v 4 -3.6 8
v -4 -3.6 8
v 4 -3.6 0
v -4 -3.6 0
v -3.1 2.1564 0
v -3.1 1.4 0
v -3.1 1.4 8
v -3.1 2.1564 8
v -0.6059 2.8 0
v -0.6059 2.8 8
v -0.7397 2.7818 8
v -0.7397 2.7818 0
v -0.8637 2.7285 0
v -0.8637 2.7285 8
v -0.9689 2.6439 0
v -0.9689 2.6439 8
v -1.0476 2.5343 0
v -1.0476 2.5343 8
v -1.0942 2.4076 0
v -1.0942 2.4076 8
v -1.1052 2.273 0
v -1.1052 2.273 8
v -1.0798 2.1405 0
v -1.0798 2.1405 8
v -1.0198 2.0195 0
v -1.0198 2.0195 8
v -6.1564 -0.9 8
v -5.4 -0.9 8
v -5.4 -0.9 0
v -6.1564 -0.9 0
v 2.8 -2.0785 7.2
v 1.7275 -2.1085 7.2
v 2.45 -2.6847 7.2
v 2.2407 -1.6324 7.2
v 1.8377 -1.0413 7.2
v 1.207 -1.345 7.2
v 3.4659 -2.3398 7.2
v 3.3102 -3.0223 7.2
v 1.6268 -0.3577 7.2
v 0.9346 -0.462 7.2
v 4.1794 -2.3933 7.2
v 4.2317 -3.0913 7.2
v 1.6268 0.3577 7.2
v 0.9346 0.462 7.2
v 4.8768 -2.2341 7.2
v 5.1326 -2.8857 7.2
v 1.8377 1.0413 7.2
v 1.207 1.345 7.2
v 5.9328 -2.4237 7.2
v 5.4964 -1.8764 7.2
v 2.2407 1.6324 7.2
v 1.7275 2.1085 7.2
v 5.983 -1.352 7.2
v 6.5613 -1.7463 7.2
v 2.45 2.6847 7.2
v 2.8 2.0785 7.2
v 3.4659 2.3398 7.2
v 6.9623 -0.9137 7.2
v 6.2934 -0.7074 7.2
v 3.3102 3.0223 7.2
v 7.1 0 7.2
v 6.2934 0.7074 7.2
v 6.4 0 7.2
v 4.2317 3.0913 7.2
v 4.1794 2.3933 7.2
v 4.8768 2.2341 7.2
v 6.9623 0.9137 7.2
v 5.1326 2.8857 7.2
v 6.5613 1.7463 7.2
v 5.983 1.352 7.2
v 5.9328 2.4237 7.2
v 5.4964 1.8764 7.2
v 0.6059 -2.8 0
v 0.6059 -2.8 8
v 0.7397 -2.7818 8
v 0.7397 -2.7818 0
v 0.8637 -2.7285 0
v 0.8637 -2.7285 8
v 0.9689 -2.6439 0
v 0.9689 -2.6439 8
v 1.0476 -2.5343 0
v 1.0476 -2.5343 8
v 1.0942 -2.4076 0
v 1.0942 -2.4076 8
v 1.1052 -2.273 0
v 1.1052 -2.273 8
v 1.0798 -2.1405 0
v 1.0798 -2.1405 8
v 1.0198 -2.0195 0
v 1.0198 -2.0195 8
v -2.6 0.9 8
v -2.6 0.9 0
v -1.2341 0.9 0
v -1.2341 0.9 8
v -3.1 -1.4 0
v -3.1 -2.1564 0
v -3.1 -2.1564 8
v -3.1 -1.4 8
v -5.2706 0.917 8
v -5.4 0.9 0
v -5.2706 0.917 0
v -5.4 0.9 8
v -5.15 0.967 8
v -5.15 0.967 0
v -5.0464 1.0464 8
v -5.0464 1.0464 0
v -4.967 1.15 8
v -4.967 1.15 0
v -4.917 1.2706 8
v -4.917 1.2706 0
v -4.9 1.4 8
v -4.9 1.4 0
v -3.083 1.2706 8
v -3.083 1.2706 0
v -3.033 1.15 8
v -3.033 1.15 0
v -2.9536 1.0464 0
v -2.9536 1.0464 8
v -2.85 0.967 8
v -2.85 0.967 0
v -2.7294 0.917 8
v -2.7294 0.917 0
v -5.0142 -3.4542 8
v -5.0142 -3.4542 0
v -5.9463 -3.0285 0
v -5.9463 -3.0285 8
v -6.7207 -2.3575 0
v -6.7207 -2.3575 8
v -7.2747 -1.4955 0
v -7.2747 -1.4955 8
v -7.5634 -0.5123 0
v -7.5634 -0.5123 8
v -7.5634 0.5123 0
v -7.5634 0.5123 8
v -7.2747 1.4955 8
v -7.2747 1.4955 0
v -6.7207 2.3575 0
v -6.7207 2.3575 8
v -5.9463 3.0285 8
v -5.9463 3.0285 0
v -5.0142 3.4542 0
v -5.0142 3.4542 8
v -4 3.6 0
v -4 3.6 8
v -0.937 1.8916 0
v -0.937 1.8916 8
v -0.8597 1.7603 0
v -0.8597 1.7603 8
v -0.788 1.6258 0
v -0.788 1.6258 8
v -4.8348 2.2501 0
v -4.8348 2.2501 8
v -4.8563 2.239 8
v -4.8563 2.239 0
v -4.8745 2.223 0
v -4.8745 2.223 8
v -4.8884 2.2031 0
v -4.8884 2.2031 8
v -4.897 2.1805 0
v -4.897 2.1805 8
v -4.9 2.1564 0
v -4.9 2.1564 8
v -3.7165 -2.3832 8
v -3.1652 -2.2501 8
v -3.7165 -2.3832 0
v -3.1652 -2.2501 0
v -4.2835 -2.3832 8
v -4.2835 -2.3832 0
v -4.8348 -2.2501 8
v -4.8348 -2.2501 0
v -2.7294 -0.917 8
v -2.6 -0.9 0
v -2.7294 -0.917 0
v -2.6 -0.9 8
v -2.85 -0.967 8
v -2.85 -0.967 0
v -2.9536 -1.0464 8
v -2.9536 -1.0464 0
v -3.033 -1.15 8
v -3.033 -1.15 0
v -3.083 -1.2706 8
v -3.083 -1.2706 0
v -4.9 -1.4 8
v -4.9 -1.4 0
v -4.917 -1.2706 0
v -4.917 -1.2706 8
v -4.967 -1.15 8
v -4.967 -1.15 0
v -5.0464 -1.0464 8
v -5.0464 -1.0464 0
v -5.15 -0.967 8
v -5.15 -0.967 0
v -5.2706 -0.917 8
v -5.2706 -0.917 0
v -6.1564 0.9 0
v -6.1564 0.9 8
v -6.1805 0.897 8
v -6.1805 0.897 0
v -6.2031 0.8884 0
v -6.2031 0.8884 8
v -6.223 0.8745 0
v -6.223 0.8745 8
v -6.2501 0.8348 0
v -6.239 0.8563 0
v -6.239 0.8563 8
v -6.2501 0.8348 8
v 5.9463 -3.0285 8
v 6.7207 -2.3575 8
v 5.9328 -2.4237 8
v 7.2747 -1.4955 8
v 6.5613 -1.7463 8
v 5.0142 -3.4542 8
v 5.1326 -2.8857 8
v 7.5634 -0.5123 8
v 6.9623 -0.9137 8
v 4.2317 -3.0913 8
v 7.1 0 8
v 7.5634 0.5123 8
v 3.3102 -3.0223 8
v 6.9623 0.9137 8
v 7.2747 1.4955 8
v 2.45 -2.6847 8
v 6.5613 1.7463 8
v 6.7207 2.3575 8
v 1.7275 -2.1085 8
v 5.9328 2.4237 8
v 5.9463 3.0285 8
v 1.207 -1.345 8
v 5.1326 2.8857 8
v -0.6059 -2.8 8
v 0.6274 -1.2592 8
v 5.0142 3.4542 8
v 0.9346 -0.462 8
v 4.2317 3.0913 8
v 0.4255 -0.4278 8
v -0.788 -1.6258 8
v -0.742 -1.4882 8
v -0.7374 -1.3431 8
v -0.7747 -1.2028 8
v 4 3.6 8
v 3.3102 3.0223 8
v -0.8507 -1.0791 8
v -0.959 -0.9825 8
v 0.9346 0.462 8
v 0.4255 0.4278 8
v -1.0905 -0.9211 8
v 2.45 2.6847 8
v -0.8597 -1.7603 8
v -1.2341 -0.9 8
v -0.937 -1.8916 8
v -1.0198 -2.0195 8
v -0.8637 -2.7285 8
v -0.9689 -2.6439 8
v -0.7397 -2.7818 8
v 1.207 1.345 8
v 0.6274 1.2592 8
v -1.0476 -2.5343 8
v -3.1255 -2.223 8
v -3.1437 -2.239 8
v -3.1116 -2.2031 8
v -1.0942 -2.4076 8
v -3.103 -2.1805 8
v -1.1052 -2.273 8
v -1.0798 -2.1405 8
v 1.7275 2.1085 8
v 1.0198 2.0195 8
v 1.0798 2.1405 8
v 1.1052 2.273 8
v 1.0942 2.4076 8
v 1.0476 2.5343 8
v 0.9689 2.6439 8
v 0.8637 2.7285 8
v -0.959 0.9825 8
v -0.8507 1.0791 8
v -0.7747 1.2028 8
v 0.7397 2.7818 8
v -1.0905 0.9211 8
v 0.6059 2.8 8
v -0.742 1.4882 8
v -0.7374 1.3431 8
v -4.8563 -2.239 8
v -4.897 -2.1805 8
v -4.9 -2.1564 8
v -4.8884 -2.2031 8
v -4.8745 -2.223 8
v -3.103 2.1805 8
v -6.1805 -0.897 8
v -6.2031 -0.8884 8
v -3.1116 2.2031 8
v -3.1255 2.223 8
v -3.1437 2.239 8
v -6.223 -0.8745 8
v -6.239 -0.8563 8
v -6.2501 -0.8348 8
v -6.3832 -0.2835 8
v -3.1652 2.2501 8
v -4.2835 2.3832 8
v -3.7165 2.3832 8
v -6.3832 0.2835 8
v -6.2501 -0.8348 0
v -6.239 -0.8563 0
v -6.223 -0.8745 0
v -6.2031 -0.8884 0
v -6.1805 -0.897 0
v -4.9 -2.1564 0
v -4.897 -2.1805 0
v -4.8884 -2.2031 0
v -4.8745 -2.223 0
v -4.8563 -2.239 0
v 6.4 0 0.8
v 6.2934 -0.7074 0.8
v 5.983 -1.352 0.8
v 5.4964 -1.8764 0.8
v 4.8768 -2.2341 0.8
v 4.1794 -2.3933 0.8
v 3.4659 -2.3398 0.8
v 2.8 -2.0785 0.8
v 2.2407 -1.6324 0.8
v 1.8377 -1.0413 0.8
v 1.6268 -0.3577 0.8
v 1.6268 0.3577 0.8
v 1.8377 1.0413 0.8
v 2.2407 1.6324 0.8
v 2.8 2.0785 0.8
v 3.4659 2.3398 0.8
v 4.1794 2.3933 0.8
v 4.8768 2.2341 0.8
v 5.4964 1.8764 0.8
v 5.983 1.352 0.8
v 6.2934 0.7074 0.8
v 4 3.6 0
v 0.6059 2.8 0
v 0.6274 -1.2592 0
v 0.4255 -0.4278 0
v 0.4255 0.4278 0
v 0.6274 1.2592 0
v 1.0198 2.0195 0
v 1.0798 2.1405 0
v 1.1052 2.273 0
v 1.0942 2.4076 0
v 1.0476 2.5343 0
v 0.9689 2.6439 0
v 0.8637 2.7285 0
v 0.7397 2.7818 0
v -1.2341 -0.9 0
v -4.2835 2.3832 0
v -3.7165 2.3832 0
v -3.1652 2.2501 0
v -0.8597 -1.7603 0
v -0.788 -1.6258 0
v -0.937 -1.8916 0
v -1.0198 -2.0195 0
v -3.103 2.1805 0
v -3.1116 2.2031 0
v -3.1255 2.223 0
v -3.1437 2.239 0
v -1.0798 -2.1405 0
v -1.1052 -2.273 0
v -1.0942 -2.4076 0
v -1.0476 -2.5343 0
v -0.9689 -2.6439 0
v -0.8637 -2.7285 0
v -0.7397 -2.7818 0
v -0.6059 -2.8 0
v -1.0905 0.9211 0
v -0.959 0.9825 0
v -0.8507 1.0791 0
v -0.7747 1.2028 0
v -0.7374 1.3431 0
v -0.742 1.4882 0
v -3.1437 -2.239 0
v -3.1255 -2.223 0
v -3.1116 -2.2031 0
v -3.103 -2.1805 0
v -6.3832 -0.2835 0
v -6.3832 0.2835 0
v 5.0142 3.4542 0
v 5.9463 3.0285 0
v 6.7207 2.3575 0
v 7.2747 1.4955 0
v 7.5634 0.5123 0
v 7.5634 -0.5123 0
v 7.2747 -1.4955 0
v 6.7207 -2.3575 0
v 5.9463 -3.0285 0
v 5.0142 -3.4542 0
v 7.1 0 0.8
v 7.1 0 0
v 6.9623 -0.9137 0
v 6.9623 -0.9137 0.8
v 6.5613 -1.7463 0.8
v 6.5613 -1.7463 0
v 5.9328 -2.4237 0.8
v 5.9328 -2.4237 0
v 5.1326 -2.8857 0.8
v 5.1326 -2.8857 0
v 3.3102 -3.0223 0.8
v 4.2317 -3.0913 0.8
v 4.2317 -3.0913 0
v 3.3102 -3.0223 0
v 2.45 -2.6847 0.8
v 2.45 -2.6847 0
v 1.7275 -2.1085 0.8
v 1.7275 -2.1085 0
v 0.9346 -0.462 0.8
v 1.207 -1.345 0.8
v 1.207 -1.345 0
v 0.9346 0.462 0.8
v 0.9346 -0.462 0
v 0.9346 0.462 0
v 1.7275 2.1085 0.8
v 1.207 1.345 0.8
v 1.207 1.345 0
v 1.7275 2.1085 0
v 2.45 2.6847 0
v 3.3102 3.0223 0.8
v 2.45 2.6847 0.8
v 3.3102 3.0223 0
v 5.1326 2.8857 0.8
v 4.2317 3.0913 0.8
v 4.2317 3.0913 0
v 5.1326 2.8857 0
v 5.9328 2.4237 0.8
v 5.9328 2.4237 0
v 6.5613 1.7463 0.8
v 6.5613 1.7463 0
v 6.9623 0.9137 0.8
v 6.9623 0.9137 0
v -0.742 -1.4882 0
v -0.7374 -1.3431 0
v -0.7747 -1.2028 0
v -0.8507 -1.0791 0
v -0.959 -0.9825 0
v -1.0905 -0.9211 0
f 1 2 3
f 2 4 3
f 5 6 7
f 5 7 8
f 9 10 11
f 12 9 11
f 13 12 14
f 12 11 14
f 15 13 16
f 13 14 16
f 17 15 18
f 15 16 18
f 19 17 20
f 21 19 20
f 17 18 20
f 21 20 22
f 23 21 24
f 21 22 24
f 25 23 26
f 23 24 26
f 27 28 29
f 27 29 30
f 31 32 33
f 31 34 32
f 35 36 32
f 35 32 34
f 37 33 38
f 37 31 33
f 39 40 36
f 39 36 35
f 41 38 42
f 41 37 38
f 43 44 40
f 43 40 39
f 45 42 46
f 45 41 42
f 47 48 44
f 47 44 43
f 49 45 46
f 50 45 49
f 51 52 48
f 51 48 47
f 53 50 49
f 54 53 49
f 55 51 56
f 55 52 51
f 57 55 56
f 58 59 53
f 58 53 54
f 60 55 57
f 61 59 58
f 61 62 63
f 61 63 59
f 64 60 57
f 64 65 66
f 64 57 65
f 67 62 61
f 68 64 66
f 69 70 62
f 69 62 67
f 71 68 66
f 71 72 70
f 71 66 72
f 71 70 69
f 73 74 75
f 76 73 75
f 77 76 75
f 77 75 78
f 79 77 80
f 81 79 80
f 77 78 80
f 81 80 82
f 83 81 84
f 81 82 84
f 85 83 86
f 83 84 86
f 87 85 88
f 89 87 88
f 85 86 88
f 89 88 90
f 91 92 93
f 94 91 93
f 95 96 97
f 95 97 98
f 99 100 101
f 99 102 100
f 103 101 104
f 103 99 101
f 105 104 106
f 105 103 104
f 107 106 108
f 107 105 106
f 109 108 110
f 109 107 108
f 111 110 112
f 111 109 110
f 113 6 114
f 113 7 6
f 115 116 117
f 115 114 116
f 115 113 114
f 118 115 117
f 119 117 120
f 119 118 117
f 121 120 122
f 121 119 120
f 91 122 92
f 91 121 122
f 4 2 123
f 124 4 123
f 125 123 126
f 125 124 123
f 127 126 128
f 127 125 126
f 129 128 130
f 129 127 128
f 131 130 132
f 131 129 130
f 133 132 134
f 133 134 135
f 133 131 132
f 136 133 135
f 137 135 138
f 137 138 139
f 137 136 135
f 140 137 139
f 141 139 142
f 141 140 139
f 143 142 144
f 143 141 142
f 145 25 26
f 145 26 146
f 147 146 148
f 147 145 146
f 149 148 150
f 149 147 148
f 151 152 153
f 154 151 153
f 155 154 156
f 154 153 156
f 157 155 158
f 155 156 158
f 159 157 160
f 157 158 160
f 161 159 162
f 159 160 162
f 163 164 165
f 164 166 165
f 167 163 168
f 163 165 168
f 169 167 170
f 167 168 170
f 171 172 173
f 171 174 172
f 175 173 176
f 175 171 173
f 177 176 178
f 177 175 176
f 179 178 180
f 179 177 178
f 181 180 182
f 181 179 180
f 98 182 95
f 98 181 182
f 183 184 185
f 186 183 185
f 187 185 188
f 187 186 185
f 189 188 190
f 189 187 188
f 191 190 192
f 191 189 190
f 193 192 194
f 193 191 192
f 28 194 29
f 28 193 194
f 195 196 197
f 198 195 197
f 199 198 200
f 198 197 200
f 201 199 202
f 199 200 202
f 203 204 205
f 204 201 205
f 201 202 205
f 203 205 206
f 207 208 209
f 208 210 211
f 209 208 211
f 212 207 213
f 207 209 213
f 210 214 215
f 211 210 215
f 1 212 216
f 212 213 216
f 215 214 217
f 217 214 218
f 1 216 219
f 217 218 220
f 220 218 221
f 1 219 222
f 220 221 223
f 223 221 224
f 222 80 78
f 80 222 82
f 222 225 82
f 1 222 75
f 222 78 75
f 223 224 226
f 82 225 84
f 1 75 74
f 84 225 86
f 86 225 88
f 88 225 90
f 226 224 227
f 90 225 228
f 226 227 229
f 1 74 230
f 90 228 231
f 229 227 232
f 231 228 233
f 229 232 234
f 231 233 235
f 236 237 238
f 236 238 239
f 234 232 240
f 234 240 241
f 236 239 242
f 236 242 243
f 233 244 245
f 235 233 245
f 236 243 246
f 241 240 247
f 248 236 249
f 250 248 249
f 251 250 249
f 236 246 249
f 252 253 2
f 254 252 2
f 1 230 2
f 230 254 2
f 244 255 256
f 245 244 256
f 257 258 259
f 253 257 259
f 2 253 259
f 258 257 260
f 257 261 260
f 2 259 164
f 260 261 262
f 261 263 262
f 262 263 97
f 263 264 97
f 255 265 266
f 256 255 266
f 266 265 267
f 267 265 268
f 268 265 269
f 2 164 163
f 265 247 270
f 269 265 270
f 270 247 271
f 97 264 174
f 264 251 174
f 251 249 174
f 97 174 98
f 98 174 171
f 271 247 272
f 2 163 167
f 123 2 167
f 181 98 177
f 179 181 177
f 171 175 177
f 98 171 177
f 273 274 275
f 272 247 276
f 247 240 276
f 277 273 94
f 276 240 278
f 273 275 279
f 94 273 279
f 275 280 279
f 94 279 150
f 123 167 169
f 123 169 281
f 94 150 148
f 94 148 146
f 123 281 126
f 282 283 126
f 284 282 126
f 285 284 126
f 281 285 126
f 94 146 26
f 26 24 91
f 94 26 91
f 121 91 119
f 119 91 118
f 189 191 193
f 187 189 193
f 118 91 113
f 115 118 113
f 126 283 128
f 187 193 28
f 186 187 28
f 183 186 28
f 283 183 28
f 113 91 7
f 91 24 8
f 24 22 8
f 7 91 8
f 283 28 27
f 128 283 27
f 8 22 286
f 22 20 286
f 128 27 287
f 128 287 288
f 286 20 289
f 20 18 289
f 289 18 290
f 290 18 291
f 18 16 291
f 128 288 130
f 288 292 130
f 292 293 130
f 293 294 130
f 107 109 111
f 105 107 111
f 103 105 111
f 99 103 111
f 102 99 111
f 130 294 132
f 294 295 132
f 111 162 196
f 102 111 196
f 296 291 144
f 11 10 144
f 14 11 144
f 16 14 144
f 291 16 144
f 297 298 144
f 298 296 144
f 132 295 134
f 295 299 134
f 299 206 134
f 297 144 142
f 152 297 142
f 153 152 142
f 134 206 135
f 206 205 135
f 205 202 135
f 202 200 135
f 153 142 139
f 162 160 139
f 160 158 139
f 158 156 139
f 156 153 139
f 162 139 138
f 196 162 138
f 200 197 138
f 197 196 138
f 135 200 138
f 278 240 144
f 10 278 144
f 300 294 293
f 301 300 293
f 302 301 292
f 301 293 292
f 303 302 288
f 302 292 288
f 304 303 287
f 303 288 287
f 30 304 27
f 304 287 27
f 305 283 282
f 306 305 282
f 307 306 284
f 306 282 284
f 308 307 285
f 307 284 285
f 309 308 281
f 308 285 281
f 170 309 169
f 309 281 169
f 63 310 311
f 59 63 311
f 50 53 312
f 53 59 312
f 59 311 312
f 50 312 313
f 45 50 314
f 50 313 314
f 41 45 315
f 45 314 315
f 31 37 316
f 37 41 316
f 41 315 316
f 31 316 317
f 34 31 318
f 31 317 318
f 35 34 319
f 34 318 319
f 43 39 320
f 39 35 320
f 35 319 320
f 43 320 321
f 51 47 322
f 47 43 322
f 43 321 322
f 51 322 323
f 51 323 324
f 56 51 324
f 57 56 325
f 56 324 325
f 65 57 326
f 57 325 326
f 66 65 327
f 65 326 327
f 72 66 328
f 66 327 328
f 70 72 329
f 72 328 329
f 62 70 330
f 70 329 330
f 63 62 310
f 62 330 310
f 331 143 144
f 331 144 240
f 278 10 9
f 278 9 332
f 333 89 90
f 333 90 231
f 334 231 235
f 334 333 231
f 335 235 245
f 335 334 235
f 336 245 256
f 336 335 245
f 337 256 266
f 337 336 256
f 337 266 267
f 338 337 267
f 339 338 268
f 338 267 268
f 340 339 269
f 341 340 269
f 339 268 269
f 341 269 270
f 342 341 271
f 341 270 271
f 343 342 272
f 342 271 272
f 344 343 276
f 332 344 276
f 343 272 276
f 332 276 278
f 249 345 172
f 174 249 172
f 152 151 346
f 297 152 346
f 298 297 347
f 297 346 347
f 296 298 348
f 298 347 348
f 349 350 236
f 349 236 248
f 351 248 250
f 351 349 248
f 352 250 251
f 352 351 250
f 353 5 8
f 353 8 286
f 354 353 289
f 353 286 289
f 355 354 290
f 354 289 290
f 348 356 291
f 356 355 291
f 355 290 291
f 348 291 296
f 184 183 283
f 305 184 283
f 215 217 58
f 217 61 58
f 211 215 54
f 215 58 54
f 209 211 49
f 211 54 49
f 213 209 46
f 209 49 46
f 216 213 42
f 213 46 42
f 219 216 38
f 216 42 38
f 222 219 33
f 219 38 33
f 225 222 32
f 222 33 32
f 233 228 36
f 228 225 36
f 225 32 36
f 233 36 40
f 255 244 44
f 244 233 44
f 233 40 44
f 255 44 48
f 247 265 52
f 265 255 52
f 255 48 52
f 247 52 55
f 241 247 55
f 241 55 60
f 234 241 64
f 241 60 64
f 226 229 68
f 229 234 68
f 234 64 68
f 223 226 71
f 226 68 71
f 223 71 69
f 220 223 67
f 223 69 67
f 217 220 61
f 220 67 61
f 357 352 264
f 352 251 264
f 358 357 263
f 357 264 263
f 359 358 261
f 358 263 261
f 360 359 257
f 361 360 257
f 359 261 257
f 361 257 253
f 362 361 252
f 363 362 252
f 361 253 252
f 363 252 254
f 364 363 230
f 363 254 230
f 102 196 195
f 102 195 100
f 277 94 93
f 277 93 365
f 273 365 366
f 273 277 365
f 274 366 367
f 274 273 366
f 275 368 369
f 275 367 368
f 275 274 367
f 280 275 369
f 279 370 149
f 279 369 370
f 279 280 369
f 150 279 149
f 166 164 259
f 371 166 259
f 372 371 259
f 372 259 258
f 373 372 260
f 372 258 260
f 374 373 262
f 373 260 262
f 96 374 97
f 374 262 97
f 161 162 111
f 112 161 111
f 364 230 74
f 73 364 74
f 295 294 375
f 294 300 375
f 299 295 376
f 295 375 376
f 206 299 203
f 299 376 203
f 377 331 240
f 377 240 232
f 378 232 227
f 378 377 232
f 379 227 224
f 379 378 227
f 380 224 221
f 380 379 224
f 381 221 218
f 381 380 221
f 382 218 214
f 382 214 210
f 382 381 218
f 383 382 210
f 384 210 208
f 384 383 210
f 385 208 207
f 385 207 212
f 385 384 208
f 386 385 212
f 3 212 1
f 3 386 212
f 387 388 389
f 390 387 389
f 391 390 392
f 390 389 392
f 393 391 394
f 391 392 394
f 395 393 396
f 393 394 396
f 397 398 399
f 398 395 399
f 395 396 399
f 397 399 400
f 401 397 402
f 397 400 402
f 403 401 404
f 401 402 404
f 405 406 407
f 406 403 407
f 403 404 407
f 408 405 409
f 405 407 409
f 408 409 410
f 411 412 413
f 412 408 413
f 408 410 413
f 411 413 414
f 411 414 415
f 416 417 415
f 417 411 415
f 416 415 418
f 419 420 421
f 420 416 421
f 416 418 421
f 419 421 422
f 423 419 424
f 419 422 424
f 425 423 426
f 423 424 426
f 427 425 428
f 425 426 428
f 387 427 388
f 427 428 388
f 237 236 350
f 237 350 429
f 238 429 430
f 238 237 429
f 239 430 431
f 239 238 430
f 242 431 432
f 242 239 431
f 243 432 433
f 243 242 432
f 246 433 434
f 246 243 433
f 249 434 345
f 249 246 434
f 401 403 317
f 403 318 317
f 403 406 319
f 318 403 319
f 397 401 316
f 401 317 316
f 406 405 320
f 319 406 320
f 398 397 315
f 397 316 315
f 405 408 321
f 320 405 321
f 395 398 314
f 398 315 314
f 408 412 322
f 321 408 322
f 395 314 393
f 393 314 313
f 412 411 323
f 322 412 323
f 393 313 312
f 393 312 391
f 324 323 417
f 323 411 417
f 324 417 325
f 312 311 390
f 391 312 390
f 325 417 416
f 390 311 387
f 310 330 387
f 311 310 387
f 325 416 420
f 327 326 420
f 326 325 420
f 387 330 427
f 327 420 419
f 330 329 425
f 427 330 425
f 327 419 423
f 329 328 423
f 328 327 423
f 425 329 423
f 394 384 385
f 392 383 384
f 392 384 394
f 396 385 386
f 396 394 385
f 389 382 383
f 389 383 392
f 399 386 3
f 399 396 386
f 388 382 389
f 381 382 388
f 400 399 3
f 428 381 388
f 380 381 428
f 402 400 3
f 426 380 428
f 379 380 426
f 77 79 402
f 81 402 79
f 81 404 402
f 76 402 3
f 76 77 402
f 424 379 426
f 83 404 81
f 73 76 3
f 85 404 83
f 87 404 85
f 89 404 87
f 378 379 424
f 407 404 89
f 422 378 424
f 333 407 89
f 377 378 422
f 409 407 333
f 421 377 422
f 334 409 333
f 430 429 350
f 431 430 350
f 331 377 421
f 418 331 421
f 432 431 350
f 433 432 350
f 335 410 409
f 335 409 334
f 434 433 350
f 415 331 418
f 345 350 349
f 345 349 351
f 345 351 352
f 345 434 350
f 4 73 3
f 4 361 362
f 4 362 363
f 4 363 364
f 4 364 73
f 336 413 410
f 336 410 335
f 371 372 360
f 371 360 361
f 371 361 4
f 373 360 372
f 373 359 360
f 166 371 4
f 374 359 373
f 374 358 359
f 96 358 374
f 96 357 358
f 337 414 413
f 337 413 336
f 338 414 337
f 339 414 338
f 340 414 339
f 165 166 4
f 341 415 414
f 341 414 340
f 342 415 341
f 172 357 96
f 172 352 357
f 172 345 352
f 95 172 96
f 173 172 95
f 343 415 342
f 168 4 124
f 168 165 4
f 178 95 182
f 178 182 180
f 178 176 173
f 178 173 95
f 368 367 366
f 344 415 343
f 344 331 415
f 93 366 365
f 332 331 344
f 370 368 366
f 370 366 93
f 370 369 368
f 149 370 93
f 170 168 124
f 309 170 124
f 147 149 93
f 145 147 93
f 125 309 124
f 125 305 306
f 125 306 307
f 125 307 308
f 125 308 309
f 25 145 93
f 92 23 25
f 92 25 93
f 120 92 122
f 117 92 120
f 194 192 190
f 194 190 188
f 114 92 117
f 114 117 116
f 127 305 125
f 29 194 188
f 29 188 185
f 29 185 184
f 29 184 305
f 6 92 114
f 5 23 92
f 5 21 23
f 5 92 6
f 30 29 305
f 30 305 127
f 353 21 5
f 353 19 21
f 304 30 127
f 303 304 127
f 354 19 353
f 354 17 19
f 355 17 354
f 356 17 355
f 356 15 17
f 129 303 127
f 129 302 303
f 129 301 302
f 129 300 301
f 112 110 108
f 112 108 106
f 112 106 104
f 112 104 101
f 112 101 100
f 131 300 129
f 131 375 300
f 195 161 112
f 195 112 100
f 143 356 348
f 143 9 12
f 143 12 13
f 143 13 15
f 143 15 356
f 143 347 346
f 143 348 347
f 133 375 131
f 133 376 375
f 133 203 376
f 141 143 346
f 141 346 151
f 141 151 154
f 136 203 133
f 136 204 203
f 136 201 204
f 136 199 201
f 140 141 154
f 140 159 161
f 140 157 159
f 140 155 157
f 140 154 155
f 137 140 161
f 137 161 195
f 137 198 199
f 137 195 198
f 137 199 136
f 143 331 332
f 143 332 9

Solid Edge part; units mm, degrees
sketch "Sketch1" plane through (0, 0, 0) normal (0, 0, 1) x (1, 0, 0)
  line L0 (-4, 3.6) -> (4, 3.6)
  line L1 (-4, -3.6) -> (4, -3.6)
  arc A0 (-4, -3.6) -> (-4, 3.6) centre (-4, 0) cw
  arc A1 (4, 3.6) -> (4, -3.6) centre (4, 0) cw
  line L2 (-1.7373, 2.8) -> (1.7373, 2.8)
  arc A2 (1.7373, -2.8) -> (1.7373, 2.8) centre (4, 0) cw
  line L3 (-1.7373, -2.8) -> (1.7373, -2.8)
  arc A3 (-0.5143, -0.9) -> (-1.7373, -2.8) centre (-4, 0) cw
  line L4 (-0.5143, -0.9) -> (-3.1, -0.9)
  line L5 (-3.1, -2.2249) -> (-3.1, -0.9)
  line L6 (-4.9, -0.9) -> (-4.9, -2.2249)
  line L7 (-4.9, -0.9) -> (-6.2249, -0.9)
  arc A4 (-6.2249, -0.9) -> (-6.2249, 0.9) centre (-4, 0) cw
  line L8 (-6.2249, 0.9) -> (-4.9, 0.9)
  line L9 (-4.9, 2.2249) -> (-4.9, 0.9)
  arc A5 (-4.9, 2.2249) -> (-3.1, 2.2249) centre (-4, 0) cw
  line L10 (-3.1, 0.9) -> (-3.1, 2.2249)
  line L11 (-3.1, 0.9) -> (-0.5143, 0.9)
  arc A6 (-1.7373, 2.8) -> (-0.5143, 0.9) centre (-4, 0) cw
  arc A7 (-3.1, -2.2249) -> (-4.9, -2.2249) centre (-4, 0) cw
extrude "Protrusion1" add sketch "Sketch1" along normal blind 8
fillet "Round_1" radius 0.5 10 edges at (-1.7373, 2.8, 4) (-0.5143, 0.9, 4) (1.7373, 2.8, 4) (-0.5143, -0.9, 4) (-1.7373, -2.8, 4) (-4.9, -0.9, 4) (-4.9, 0.9, 4) (-3.1, 0.9, 4) (-3.1, -0.9, 4) (1.7373, -2.8, 4)
fillet "Round_2" radius 0.1 6 edges at (-4.9, 2.2249, 4) (-3.1, 2.2249, 4) (-6.2249, -0.9, 4) (-6.2249, 0.9, 4) (-4.9, -2.2249, 4) (-3.1, -2.2249, 4)
sketch "Sketch2" plane through (0, 0, 0) normal (0, -1, 0) x (1, 0, 0)
  line L0 (7.1, 0) -> (4, 0)
  line L1 (7.1, 0.8) -> (7.1, 0)
  line L2 (6.4, 0.8) -> (7.1, 0.8)
  line L3 (6.4, 7.2) -> (6.4, 0.8)
  line L4 (7.1, 7.2) -> (6.4, 7.2)
  line L5 (7.1, 8) -> (7.1, 7.2)
  line L6 (4, 8) -> (7.1, 8)
revolve "RevolvedCutout1" cut sketch "Sketch2" angle 360 about axis through (4, 0, 0) along (0, 0, 1)
